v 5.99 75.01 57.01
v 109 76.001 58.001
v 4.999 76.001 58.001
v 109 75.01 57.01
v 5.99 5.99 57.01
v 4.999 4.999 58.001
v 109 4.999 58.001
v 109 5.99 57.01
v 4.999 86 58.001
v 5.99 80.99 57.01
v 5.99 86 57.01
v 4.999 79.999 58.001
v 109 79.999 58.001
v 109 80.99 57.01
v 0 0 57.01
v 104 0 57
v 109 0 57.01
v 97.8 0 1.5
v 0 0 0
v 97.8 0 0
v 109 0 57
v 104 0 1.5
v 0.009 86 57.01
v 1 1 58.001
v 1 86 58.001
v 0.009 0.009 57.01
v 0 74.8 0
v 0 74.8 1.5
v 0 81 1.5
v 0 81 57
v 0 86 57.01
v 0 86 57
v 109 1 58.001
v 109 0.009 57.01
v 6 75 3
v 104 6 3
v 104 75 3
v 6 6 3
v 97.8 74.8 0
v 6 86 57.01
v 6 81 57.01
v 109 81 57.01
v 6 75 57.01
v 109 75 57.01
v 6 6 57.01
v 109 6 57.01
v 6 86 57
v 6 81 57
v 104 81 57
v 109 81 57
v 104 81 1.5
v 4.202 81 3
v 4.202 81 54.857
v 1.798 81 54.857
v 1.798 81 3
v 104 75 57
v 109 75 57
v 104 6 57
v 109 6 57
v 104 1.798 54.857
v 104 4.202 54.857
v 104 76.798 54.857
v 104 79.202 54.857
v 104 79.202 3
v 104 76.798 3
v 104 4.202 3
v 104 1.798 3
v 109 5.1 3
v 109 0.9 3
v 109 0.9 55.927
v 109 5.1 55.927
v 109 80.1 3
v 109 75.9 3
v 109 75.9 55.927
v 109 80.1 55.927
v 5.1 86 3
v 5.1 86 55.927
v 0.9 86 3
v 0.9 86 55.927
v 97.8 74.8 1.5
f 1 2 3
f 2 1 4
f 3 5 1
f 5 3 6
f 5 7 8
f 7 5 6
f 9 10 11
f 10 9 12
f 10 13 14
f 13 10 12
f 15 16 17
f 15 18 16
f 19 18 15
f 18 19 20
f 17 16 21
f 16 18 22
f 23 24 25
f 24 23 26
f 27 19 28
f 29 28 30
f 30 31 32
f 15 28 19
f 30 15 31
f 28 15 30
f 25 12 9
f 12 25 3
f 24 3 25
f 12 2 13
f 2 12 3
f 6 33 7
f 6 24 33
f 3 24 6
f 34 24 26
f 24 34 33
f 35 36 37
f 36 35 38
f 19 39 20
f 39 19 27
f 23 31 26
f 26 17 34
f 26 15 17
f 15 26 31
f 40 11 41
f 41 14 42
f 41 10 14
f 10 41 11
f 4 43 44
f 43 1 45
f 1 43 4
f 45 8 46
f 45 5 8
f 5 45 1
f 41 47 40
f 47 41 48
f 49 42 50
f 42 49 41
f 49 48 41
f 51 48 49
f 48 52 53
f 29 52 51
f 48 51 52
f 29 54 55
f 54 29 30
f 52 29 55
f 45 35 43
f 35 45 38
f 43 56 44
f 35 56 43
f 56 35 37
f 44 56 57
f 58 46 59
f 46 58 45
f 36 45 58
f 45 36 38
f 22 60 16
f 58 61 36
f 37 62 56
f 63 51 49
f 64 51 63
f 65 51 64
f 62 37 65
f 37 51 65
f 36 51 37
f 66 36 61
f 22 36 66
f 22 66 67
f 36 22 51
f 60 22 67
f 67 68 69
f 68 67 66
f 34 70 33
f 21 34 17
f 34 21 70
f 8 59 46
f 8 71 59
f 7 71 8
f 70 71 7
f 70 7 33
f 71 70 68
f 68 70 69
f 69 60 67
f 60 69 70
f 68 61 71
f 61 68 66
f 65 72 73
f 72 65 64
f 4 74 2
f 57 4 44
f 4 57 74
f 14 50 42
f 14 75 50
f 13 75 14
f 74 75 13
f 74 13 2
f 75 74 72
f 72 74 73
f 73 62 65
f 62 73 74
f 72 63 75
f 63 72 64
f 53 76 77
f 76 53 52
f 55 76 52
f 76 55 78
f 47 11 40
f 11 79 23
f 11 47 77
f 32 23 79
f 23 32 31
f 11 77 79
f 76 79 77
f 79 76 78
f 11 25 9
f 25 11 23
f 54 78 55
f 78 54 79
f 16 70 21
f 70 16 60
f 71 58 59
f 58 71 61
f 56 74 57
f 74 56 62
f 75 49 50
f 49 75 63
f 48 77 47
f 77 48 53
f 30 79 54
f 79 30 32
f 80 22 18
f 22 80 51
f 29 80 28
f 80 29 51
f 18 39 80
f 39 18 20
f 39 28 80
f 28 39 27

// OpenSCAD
// ============================================================================
// cutlery_box.scad
// Graduated 3-chamber disposable-cutlery box (Option 3) — CUT-FROM-SOLID port
// of build_box.py, for a 120 x 120 x 120 mm printer (AOSEED).
//
// WHY THIS PORT EXISTS (the whole point):
//   The hand-mesh generator (build_box.py) could not keep the 1 mm rim chamfer
//   continuous across the female dovetail joints, because where a slot's flared
//   corner crosses the sloped chamfer it needs a true boolean intersection.
//   OpenSCAD HAS that boolean kernel, so here we do exactly the "cut-from-solid"
//   thing:
//      1. Build the ENTIRE box as ONE solid, WITH the chamfer already on it.
//      2. difference() out vertical dovetail prisms ( /_\ cross-section ),
//         running from just above the base plate up THROUGH the rim, to both
//         (a) form the sliding-dovetail joints, and
//         (b) split the box into 6 bed-sized pieces.
//   Because the cut is a real boolean through the already-chamfered solid, the
//   sloped chamfer<->slot edge is produced for free => the rim chamfer stays
//   CONTINUOUS across every joint, with none of the sliver hacks.
//
// ----------------------------------------------------------------------------
// HOW TO USE
//   In the app:  set `part` below (or use the Customizer dropdown), F5 to
//                preview, F6 to render, then File > Export > STL.
//   One piece (CLI):
//      openscad -o body_knife_A.stl -D 'part="knife_A"' cutlery_box.scad
//   ALL SIX (bash, run from this folder):
//      for p in knife_A knife_B fork_A fork_B spoon_A spoon_B; do \
//        openscad -o "body_$p.stl" -D "part=\"$p\"" cutlery_box.scad ; done
//   PNG preview of one piece:
//      openscad -o knife_B.png --imgsize=1400,1000 --autocenter --viewall \
//        -D 'part="knife_B"' cutlery_box.scad
//
//   Pieces are modelled in ASSEMBLED coordinates (floor-down, z=0 is the bed),
//   so importing all six STLs together shows the assembled box directly; your
//   slicer will auto-drop each one onto the plate for printing.
//
// BED SANITY: every piece is <= 120 mm in X, Y, Z.
//   Z = 58 mm. Widest piece = spoon at 117 mm (Y). A-halves reach 109 mm (X,
//   including the protruding dovetail key). All under 120.
//
// !! I could NOT run OpenSCAD to verify this file (no binary in my sandbox) !!
//   - The rim chamfer is a SMOOTH, true-45 bevel built from hull() frustums of
//     convex rectangles. Works in every OpenSCAD since ~2015 (incl. Homebrew
//     2021.01). No stepped staircase -- and, crucially, it makes box() a clean
//     well-formed solid so the per-part booleans resolve reliably (the old
//     14-slice staircase was fragile and CGAL was dropping the walls of the
//     interior parts, leaving only the key prisms => "floating boxes").
//   - roof() is still available behind USE_ROOF=true for those who have it
//     (2021.01+ snapshots); for THIS rectangular design it is identical, so it
//     is NOT required.
//   - After F6, check the console for "WARNING"/"not a valid 2-manifold".
//     If a tenon ever looks detached, bump EPS to 0.05.
// ============================================================================


/* [Part to render / export] */
part = "knife_A"; // [knife_A, knife_B, fork_A, fork_B, spoon_A, spoon_B, assembly]

/* [Chamfer method] */
// false = smooth hull() frustum bevel (default, any OpenSCAD); true = roof() (2021.01+)
USE_ROOF = false;

/* [Heights (mm)] */
BASE   = 3.0;     // floor / base-plate thickness
COMP_H = 55.0;    // interior wall height above the floor (cutlery stack depth)

/* [Walls (mm)] */
HOST_T   = 6.0;     // thickness of every wall (thick enough to host a dovetail)
HALF_LEN = 104.0;   // printed length of each half (A = near, B = far); <120 incl. key

/* [Chamber bays (mm)] */
N_COL     = 3;       // columns of cutlery per chamber
KNIFE_COL = 23.0;    // -> knife bay 69  (3 x 19 mm knives + play)
FORK_COL  = 33.0;    // -> fork  bay 99  (3 x 29 mm forks  + play)
SPOON_COL = 37.0;    // -> spoon bay 111 (3 x 34 mm spoons + play, trimmed <120)

/* [Dovetail joint (mm)] */
DT_DEPTH = 5.0;   // tail protrusion past the seam (male key depth)
DT_NECK  = 1.2;   // half-width at the seam face (narrow)
DT_FLARE = 2.1;   // half-width at the tip (wide -> locks)
DT_CLR   = 0.4;   // FLANK/seam slide clearance added to the female socket (do not change for fit)
DT_DEPTH_RELIEF = 0.3; // extra depth on the socket BACK only, so the tail tip never bottoms out

/* [Hidden-dovetail top cap / "hat" (mm)] */
// The dovetail otherwise shows its trapezoid outline on the TOP edge of the wall.
// To hide it, the MALE piece extends the wall's full-width top (chamfer included)
// across the key footprint -> a flush, continuous top. The FEMALE piece gets a
// matching top RECESS (cap footprint + CAP_CLR) so the cap drops straight in.
// Result: the top reads as one surface with a single straight seam line at the cap
// tip; the dovetail joinery lives entirely below the cap.
//
// SELF-SUPPORTING UNDERSIDE: the cap reaches the FULL wall width at the chamfer base
// (so the top edge reads as the wall extended, with NO recessed sliver on the outer
// face), and its underside is ONE planar ramp from the chamfer's OUTER CORNER
// (half-width HOST_T/2 at z = BODY_H-CHAMFER) down to the dovetail-neck half-width
// (CAP_FOOT) at CAP_SLANT_DEG from horizontal. No little horizontal step. The ramp
// reaching full width exactly at the chamfer base means "ramp top" == "chamfer base"
// (CAP_H is DERIVED). The FEMALE recess is the same ramp + CAP_CLR play.
// TRADEOFF: because the cap runs all the way to the outer corner, the female wall
// tapers to ~0 at z = BODY_H-CHAMFER -> a thin feather edge at the joint (gradual at
// CAP_SLANT_DEG, hidden inside the joint when assembled). Accepted per design intent.
CAP_SLANT_DEG = 50;     // cap underside ramp angle from horizontal (50 = self-supporting, long flare)
CAP_FOOT = DT_NECK;     // cap-underside half-width where it meets the dovetail neck
CAP_CLR = 0.3;          // slide clearance so the male cap seats into the female top recess

/* [Rim chamfer (mm)] */
CHAMFER = 1.0;    // 45-deg comfort break broken along the top wall edges

/* [Base half-lap / anti-warp (mm)] */
// Neighbouring base plates overlap as a HORIZONTAL half-lap (shiplap) at mid-base
// height, so corners stay coplanar (no lift/protrusion). Horizontal lap faces do
// NOT bind the vertical-drop assembly. Shingle direction: A->B and knife->fork->spoon.
LAP_LEN = 6;        // overlap past the A/B seam and the knife/fork seam
LAP_LEN_FS = 2;     // overlap past the fork/SPOON seam -- SMALLER: spoon is the
                    // tightest piece (117mm of the 120mm bed); a 6mm lap there
                    // would push spoon to 123mm. 2mm keeps spoon at 119mm.
LAP_Z   = BASE/2;   // 1.5 -- horizontal split height of the lap (bottom vs top half)
LAP_CLR = 0.2;      // in-plane clearance so the shelf isn't a press fit


/* [Hidden] */
EPS      = 0.01;          // tiny overlap so abutting solids fuse cleanly in CGAL
// Upper-chamber pieces (fork, spoon) were cut by a cell plane laid EXACTLY on the
// divider wall's far face (the lower chamber owns that wall). intersection() along a
// plane coincident with an existing box face makes CGAL leave a ZERO-THICKNESS copy
// of the wall face -> edge-manifold + "watertight" but degenerate (OpenSCAD shows it
// as a blue back-face; Tinkercad thickens it into a phantom block). SEAM_EPS nudges
// those cut planes a hair INTO the open bay so they no longer coincide with any box
// face -> no flap. 0.02 mm is physically nothing but is well clear of CGAL's tolerance.
SEAM_EPS = 0.02;
CUT_OVER = 1.0;           // how far dovetail cutters overshoot the rim (clean cut)

BODY_H    = BASE + COMP_H;     // 58  total height
END_WALL  = HOST_T;            // end walls are dovetail hosts too -> equally thick
TOTAL_LEN = 2 * HALF_LEN;      // 208 assembled length (end wall .. end wall)

// hidden-cap ramp geometry (derived).
//   CAP_HW    = cap MAX half-width = HOST_T/2 (the full wall edge) at the chamfer base.
//   CAP_RISE  = vertical height of the self-supporting CAP_SLANT_DEG underside ramp.
//   CAP_ZRAMP = where the cap reaches full width = the chamfer base (BODY_H-CHAMFER), so
//               the ramp runs straight to the chamfer OUTER CORNER (no horizontal step).
//   CAP_ZBOT  = cap bottom = ramp start; CAP_H derived from it (for reference/report).
//   CAP_ZRAMP_R = recess ramp top, shifted down by CAP_CLR so the recess ramp stays
//               parallel to the cap ramp with uniform play.
CAP_HW      = HOST_T/2;   // cap reaches the FULL wall edge at the chamfer base
CAP_RISE    = (CAP_HW - CAP_FOOT) * tan(CAP_SLANT_DEG);
CAP_ZRAMP   = BODY_H - CHAMFER;               // full width exactly at the chamfer base / outer corner
CAP_ZBOT    = CAP_ZRAMP - CAP_RISE;
CAP_H       = BODY_H - CAP_ZBOT;              // derived; reported
CAP_ZRAMP_R = CAP_ZRAMP;   // recess ramp ALSO tops at the chamfer corner (mirror the cap) -> no vertical lip
// sanity checks
assert(CAP_ZBOT > BASE + 1,
       "cap zone dips too low -- raise CAP_SLANT_DEG");
assert(CAP_HW >= DT_FLARE,
       "cap too narrow to cover the dovetail tail");

// bay widths
KNIFE_BAY = N_COL * KNIFE_COL; // 69
FORK_BAY  = N_COL * FORK_COL;  // 99
SPOON_BAY = N_COL * SPOON_COL; // 111

// ---- Y layout (width direction): wall | bay | divider | bay | divider | bay | wall
KNIFE_Y0 = 0;
KNIFE_Y1 = HOST_T + KNIFE_BAY + HOST_T;        // 0..81   (outer wall + bay + divider)
FORK_Y0  = KNIFE_Y1;                           // 81
FORK_Y1  = FORK_Y0 + FORK_BAY + HOST_T;        // 81..186 (bay + divider)
SPOON_Y0 = FORK_Y1;                            // 186
SPOON_Y1 = SPOON_Y0 + SPOON_BAY + HOST_T;      // 186..303(bay + outer wall)
EXT_W    = SPOON_Y1;                           // 303 total width

// lengthwise wall Y-bands [y0,y1] (host the A/B dovetails) + their centers
OUTER_L  = [0, HOST_T];                                       // [0,6]    c=3
DIV_KF   = [HOST_T + KNIFE_BAY, HOST_T + KNIFE_BAY + HOST_T]; // [75,81]  c=78
DIV_FS   = [FORK_Y0 + FORK_BAY, FORK_Y0 + FORK_BAY + HOST_T]; // [180,186]c=183
OUTER_R  = [SPOON_Y1 - HOST_T, SPOON_Y1];                     // [297,303]c=300

// the three OPEN bays are rectangular holes in the wall footprint:
//   footprint = outer rectangle MINUS these bays  (== the 6 walls; verified).
// The smooth chamfer is built from exactly this decomposition.
BAY_X0 = END_WALL;              // 6
BAY_X1 = TOTAL_LEN - END_WALL;  // 202
BAYS = [
    [BAY_X0, BAY_X1, HOST_T,   HOST_T + KNIFE_BAY],   // knife bay [6,202] x [6,75]
    [BAY_X0, BAY_X1, FORK_Y0,  FORK_Y0 + FORK_BAY],   // fork  bay [6,202] x [81,180]
    [BAY_X0, BAY_X1, SPOON_Y0, SPOON_Y0 + SPOON_BAY], // spoon bay [6,202] x [186,297]
];

YC_OUTL  = OUTER_L[0] + HOST_T/2;   // 3   outer-left wall center
YC_DIVKF = DIV_KF[0]  + HOST_T/2;   // 78  knife/fork divider center
YC_DIVFS = DIV_FS[0]  + HOST_T/2;   // 183 fork/spoon divider center
YC_OUTR  = OUTER_R[0] + HOST_T/2;   // 300 outer-right wall center

// seams
AB_SEAM = HALF_LEN;               // 104  A/B length seam (x)
SEAM_KF = FORK_Y0;                // 81   knife/fork width seam (y)
SEAM_FS = SPOON_Y0;              // 186  fork/spoon width seam (y)
ENDC_A  = END_WALL/2;             // 3    A end-wall center (x) -> chamber dovetails
ENDC_B  = TOTAL_LEN - END_WALL/2; // 205  B end-wall center (x)


// ============================================================================
// 2D wall footprint (cross-section of all walls, constant in z for the straight
// part). Union of: 2 full-width end walls + 4 lengthwise walls between them.
// ============================================================================
module wall_footprint_2d() {
    // footprint = outer rectangle minus the 3 open bays  (== the 6 walls)
    difference() {
        square([TOTAL_LEN, EXT_W]);
        for (b = BAYS) translate([b[0], b[2]]) square([b[1] - b[0], b[3] - b[2]]);
    }
}

// ============================================================================
// The full chamfered box solid = base plate + walls with a continuous 1 mm
// top-rim chamfer. Built ONCE; every piece is carved out of this.
// ============================================================================
module chamfer_cap() {
    // SMOOTH 45 rim chamfer over z[BODY_H-CHAMFER, BODY_H], in absolute coords.
    zm = BODY_H - CHAMFER;
    if (USE_ROOF) {
        // exact straight-skeleton roof, capped at CHAMFER height (needs roof()).
        intersection() {
            translate([0,0,zm]) roof() wall_footprint_2d();
            translate([0,0,zm]) linear_extrude(CHAMFER + EPS) wall_footprint_2d();
        }
    } else {
        // DEFAULT: true 45 bevel as hull() frustums of CONVEX rectangles -> smooth
        // AND a clean manifold.  Since footprint = outer - bays, the chamfer of the
        // footprint = (outer rectangle beveled inward) MINUS (each bay beveled so it
        // grows toward the top, which bevels every bay-facing rim).  All hull()s are
        // on convex rectangles, so nothing gets convex-filled.
        difference() {
            // outer perimeter frustum: full outer rect at zm -> inset by CHAMFER at top
            hull() {
                translate([0,0,zm])     linear_extrude(0.001) square([TOTAL_LEN, EXT_W]);
                translate([0,0,BODY_H]) linear_extrude(0.001) offset(delta=-CHAMFER) square([TOTAL_LEN, EXT_W]);
            }
            // each bay grows by CHAMFER toward the top -> bevels its surrounding rim.
            // (overshoots z a hair past both ends so the cut is clean.)
            for (b = BAYS)
                hull() {
                    translate([0,0,zm-EPS])     linear_extrude(0.001)
                        translate([b[0],b[2]]) offset(delta=-EPS)        square([b[1]-b[0], b[3]-b[2]]);
                    translate([0,0,BODY_H+EPS]) linear_extrude(0.001)
                        translate([b[0],b[2]]) offset(delta=CHAMFER+EPS) square([b[1]-b[0], b[3]-b[2]]);
                }
        }
    }
}

module box() {
    zm = BODY_H - CHAMFER;
    union() {
        cube([TOTAL_LEN, EXT_W, BASE]);                                        // base plate z[0,3]
        translate([0,0,BASE]) linear_extrude(zm - BASE + EPS) wall_footprint_2d(); // straight walls z[3,57]
        chamfer_cap();                                                         // smooth chamfer z[57,58]
    }
}

// ============================================================================
// Dovetail prisms ( /_\ ). Vertical, z[BASE, BODY_H+CUT_OVER] so they cut
// through the rim but leave the base plate continuous. The near face is pushed
// back EPS so a male key always fuses to its wall.
//   male key   : half_n=DT_NECK,         half_f=DT_FLARE
//   female slot: half_n=DT_NECK+DT_CLR,  half_f=DT_FLARE+DT_CLR
// ============================================================================
module dt_prism_X(seam_x, yc, half_n, half_f) {   // perpendicular to X, grows +X
    translate([0,0,BASE]) linear_extrude(BODY_H - BASE + CUT_OVER)
        polygon([[seam_x - EPS,        yc - half_n],
                 [seam_x + DT_DEPTH,   yc - half_f],
                 [seam_x + DT_DEPTH,   yc + half_f],
                 [seam_x - EPS,        yc + half_n]]);
}
module dt_prism_Y(seam_y, xc, half_n, half_f) {   // perpendicular to Y, grows +Y
    translate([0,0,BASE]) linear_extrude(BODY_H - BASE + CUT_OVER)
        polygon([[xc - half_n, seam_y - EPS],
                 [xc - half_f, seam_y + DT_DEPTH],
                 [xc + half_f, seam_y + DT_DEPTH],
                 [xc + half_n, seam_y - EPS]]);
}
module ab_key   (yc)        { dt_prism_X(AB_SEAM, yc, DT_NECK, DT_FLARE); }
module ch_key   (seam_y, xc){ dt_prism_Y(seam_y, xc, DT_NECK, DT_FLARE); }

// Female sockets = male + DT_CLR on the flanks/seam (unchanged), PLUS a straight
// back-face relief of DT_DEPTH_RELIEF so the tail tip never bottoms out. The
// relief is a rectangle tacked onto the trapezoid's tip at the SAME flare width,
// so the angled flank faces (and their 0.4 mm slide clearance) are untouched.
module ab_socket(yc) {
    dt_prism_X(AB_SEAM, yc, DT_NECK + DT_CLR, DT_FLARE + DT_CLR);
    translate([0,0,BASE]) linear_extrude(BODY_H - BASE + CUT_OVER)
        translate([AB_SEAM + DT_DEPTH, yc - (DT_FLARE + DT_CLR)])
            square([DT_DEPTH_RELIEF, 2*(DT_FLARE + DT_CLR)]);          // back relief, +X
}
module ch_socket(seam_y, xc) {
    dt_prism_Y(seam_y, xc, DT_NECK + DT_CLR, DT_FLARE + DT_CLR);
    translate([0,0,BASE]) linear_extrude(BODY_H - BASE + CUT_OVER)
        translate([xc - (DT_FLARE + DT_CLR), seam_y + DT_DEPTH])
            square([2*(DT_FLARE + DT_CLR), DT_DEPTH_RELIEF]);          // back relief, +Y
}

// ===== hidden-dovetail top cap ("hat"), SELF-SUPPORTING underside ===============
// MALE cap: a FULL-wall-width hat whose underside is ONE planar ramp from the chamfer's
// OUTER CORNER (half-width CAP_HW = HOST_T/2 at CAP_ZRAMP = BODY_H-CHAMFER) down to the
// dovetail-neck half-width (CAP_FOOT) at CAP_SLANT_DEG from horizontal -> the self-
// supporting shoulder, running straight to the corner (no horizontal step). Built as
// hull(narrow bottom slab buried in the tail neck, full-width top slab through the rim);
// box() trims it to the wall and adds the continuous rim chamfer for free, so the outer
// top edge reads as the wall extended (no recessed sliver). The protruding NOSE is left
// SQUARE (vertical) -- hidden in the female socket when assembled.
// TRADEOFF: the female wall tapers to ~0 at z=BODY_H-CHAMFER (a thin feather edge at the
// joint, gradual at CAP_SLANT_DEG) -- accepted per design intent.
module ab_cap(yc) {   // A/B seam, grows +X past the seam (length direction)
    hull() {
        translate([AB_SEAM - EPS, yc - CAP_FOOT, CAP_ZBOT])
            cube([DT_DEPTH + EPS, 2*CAP_FOOT, EPS]);
        translate([AB_SEAM - EPS, yc - CAP_HW,   CAP_ZRAMP])
            cube([DT_DEPTH + EPS, 2*CAP_HW, (BODY_H + CUT_OVER) - CAP_ZRAMP]);
    }
}
module ch_cap(seam_y, xc) {   // chamber seam, grows +Y past the seam (in the end wall)
    hull() {
        translate([xc - CAP_FOOT, seam_y - EPS, CAP_ZBOT])
            cube([2*CAP_FOOT, DT_DEPTH + EPS, EPS]);
        translate([xc - CAP_HW,   seam_y - EPS, CAP_ZRAMP])
            cube([2*CAP_HW, DT_DEPTH + EPS, (BODY_H + CUT_OVER) - CAP_ZRAMP]);
    }
}
// FEMALE recess: the SAME ramp grown by CAP_CLR (flanks, tip, floor, and ramp shifted down
// by CAP_CLR so it stays parallel) -> the cap seats with uniform slide clearance. It opens
// to the wall edge (and a hair past, into air) so the cap's full-width corner drops in;
// this is what leaves the thin female feather at the top (accepted). Open upward + toward seam.
module ab_cap_neg(yc) {
    hull() {
        translate([AB_SEAM - EPS, yc - (CAP_FOOT + CAP_CLR), CAP_ZBOT - CAP_CLR])
            cube([DT_DEPTH + CAP_CLR + EPS, 2*(CAP_FOOT + CAP_CLR), EPS]);
        translate([AB_SEAM - EPS, yc - (CAP_HW + EPS), CAP_ZRAMP_R])
            cube([DT_DEPTH + CAP_CLR + EPS, 2*(CAP_HW + EPS), (BODY_H + CUT_OVER + 1) - CAP_ZRAMP_R]);
    }
}
module ch_cap_neg(seam_y, xc) {
    hull() {
        translate([xc - (CAP_FOOT + CAP_CLR), seam_y - EPS, CAP_ZBOT - CAP_CLR])
            cube([2*(CAP_FOOT + CAP_CLR), DT_DEPTH + CAP_CLR + EPS, EPS]);
        translate([xc - (CAP_HW + EPS), seam_y - EPS, CAP_ZRAMP_R])
            cube([2*(CAP_HW + EPS), DT_DEPTH + CAP_CLR + EPS, (BODY_H + CUT_OVER + 1) - CAP_ZRAMP_R]);
    }
}

// rectangular cell (x[xa,xb], y[ya,yb], full height + margin) used to split pieces
module cell(xa, xb, ya, yb) {
    translate([xa, ya, -1]) cube([xb - xa, yb - ya, BODY_H + 11]);
}

// ===== base half-lap (shiplap) =================================================
// HORIZONTAL lap at mid-base height: the shelf-owner keeps its BOTTOM half
// (z 0..LAP_Z) extending LAP_LEN past the seam; the neighbour has its bottom half
// REMOVED there (keeps only the top half) and lands flat on the shelf. Horizontal
// faces => no binding during the vertical drop. Shelves live entirely in the base
// (z < BASE), well clear of the wall dovetails (z >= BASE).
// Shingle = FEMALE-first (matches the no-notch dovetail assembly order, which
// lowers the male piece onto the female): the B half owns the A/B shelf (grows
// -X into A) and the UPPER chamber (fork, spoon) owns the chamber shelf (grows
// -Y into the lower chamber).  Order: spoon, fork, knife; B before A.
module lap_shelf_X(y0, y1) {                 // B-side shelf, grows -X into A past AB_SEAM
    // +EPS past AB_SEAM so the shelf interpenetrates (not just abuts) its own B body -> fuses cleanly.
    translate([AB_SEAM - LAP_LEN, y0, 0]) cube([LAP_LEN + EPS, y1 - y0, LAP_Z]);
}
module lap_neg_X(y0, y1) {                   // A-side: remove bottom half to receive it
    translate([AB_SEAM - LAP_LEN - LAP_CLR, y0 - EPS, -EPS])
        cube([LAP_LEN + LAP_CLR + EPS, (y1 - y0) + 2*EPS, LAP_Z + EPS]);
}
module lap_shelf_Y(seam_y, x0, x1, ln=LAP_LEN) {   // upper-chamber shelf, grows -Y into lower
    // grows -Y by `ln` into the lower chamber AND +Y by 2*SEAM_EPS past the seam so it
    // always overlaps the (SEAM_EPS-nudged) body floor and stays fused -> no floating shelf.
    translate([x0, seam_y - ln, 0]) cube([x1 - x0, ln + 2*SEAM_EPS, LAP_Z]);
}
module lap_neg_Y(seam_y, x0, x1, ln=LAP_LEN) {     // lower-chamber: remove bottom half
    translate([x0 - EPS, seam_y - ln - LAP_CLR, -EPS])
        cube([(x1 - x0) + 2*EPS, ln + LAP_CLR + EPS, LAP_Z + EPS]);
}

// ============================================================================
// The six pieces.  piece = intersection(box, cell + own male keys) - own sockets
//   A halves are MALE on the A/B seam (keep the key); B halves are FEMALE (slot).
//   On a chamber seam the LEFT chamber is male (+Y), the right chamber is female.
// ============================================================================
// Base half-lap shingling (FEMALE-first, Option 1):
//   A/B seam  -> the B half owns the bottom shelf (grows -X), A has the negative.
//   chamber   -> the UPPER chamber (fork, spoon) owns the shelf (grows -Y); the
//                lower chamber (knife, fork) has the negative.
//   Assembly order: spoon, fork, knife; B before A (male lowered onto female).
// Center crossings (104,81)&(104,186): the CHAMBER shelf (fork_A / spoon_A) owns the
//   crossing square; the B-half A/B shelf (knife_B / fork_B) is CLIPPED short of the
//   chamber seam by LAP_LEN so two shelves never collide.
module knife_A() {                                       // placed LAST; receives everything
    difference() {
        intersection() {
            box();
            union() {
                cell(-1, AB_SEAM, KNIFE_Y0 - 1, KNIFE_Y1);
                ab_key(YC_OUTL); ab_key(YC_DIVKF); ch_key(SEAM_KF, ENDC_A);
                ab_cap(YC_OUTL); ab_cap(YC_DIVKF); ch_cap(SEAM_KF, ENDC_A);  // hide tops (male)
            }
        }
        lap_neg_X(KNIFE_Y0, KNIFE_Y1);            // receive knife_B's A/B shelf
        lap_neg_Y(SEAM_KF, 0, AB_SEAM);           // receive fork_A's chamber shelf
    }
}

module knife_B() {
    difference() {
        union() {
            intersection() {
                box();
                union() {
                    cell(AB_SEAM, TOTAL_LEN + 1, KNIFE_Y0 - 1, KNIFE_Y1);
                    ch_key(SEAM_KF, ENDC_B);
                    ch_cap(SEAM_KF, ENDC_B);                // hide top (male, chamber)
                }
            }
            lap_shelf_X(KNIFE_Y0, KNIFE_Y1 - LAP_LEN);  // A/B shelf -> knife_A (CLIPPED at y=81 crossing)
        }
        ab_socket(YC_OUTL); ab_socket(YC_DIVKF);
        ab_cap_neg(YC_OUTL); ab_cap_neg(YC_DIVKF);      // top recesses to receive knife_A's caps (female)
        lap_neg_Y(SEAM_KF, AB_SEAM, TOTAL_LEN);         // receive fork_B's chamber shelf
    }
}

module fork_A() {
    difference() {
        union() {
            intersection() {
                box();
                union() {
                    cell(-1, AB_SEAM, FORK_Y0 + SEAM_EPS, FORK_Y1);  // -Y cut nudged off the divider face
                    ab_key(YC_DIVFS); ch_key(SEAM_FS, ENDC_A);
                    ab_cap(YC_DIVFS); ch_cap(SEAM_FS, ENDC_A);       // hide tops (male)
                }
            }
            lap_shelf_Y(SEAM_KF, 0, AB_SEAM);           // chamber shelf -> knife_A (owns crossing)
        }
        lap_neg_X(FORK_Y0, FORK_Y1);                    // receive fork_B's A/B shelf
        ch_socket(SEAM_KF, ENDC_A);
        ch_cap_neg(SEAM_KF, ENDC_A);                    // top recess to receive knife_A's chamber cap (female)
        lap_neg_Y(SEAM_FS, 0, AB_SEAM, LAP_LEN_FS);     // receive spoon_A's (small) chamber shelf
    }
}

module fork_B() {
    difference() {
        union() {
            intersection() {
                box();
                union() {
                    cell(AB_SEAM, TOTAL_LEN + 1, FORK_Y0 + SEAM_EPS, FORK_Y1);  // -Y cut nudged off the divider face
                    ch_key(SEAM_FS, ENDC_B);
                    ch_cap(SEAM_FS, ENDC_B);                // hide top (male, chamber)
                }
            }
            lap_shelf_X(FORK_Y0, FORK_Y1 - LAP_LEN_FS); // A/B shelf -> fork_A (CLIPPED at y=186 crossing)
            lap_shelf_Y(SEAM_KF, AB_SEAM, TOTAL_LEN);   // chamber shelf -> knife_B
        }
        ab_socket(YC_DIVFS);
        ab_cap_neg(YC_DIVFS);                           // top recess to receive fork_A's A/B cap (female)
        ch_socket(SEAM_KF, ENDC_B);
        ch_cap_neg(SEAM_KF, ENDC_B);                    // top recess to receive knife_B's chamber cap (female)
        lap_neg_Y(SEAM_FS, AB_SEAM, TOTAL_LEN, LAP_LEN_FS); // receive spoon_B's (small) chamber shelf
    }
}

module spoon_A() {
    difference() {
        union() {
            intersection() {
                box();
                union() {
                    cell(-1, AB_SEAM, SPOON_Y0 + SEAM_EPS, SPOON_Y1 + 1);  // -Y cut nudged off the divider face
                    ab_key(YC_OUTR);
                    ab_cap(YC_OUTR);                        // hide top (male)
                }
            }
            lap_shelf_Y(SEAM_FS, 0, AB_SEAM, LAP_LEN_FS); // chamber shelf -> fork_A (small; owns crossing)
        }
        lap_neg_X(SPOON_Y0, SPOON_Y1);                  // receive spoon_B's A/B shelf
        ch_socket(SEAM_FS, ENDC_A);
        ch_cap_neg(SEAM_FS, ENDC_A);                    // top recess to receive fork_A's chamber cap (female)
    }
}

module spoon_B() {                                      // placed FIRST; owns shelves
    difference() {
        union() {
            intersection() {
                box();
                union() {
                    cell(AB_SEAM, TOTAL_LEN + 1, SPOON_Y0 + SEAM_EPS, SPOON_Y1 + 1);  // -Y cut nudged off the divider face
                }
            }
            lap_shelf_X(SPOON_Y0, SPOON_Y1);            // A/B shelf -> spoon_A
            lap_shelf_Y(SEAM_FS, AB_SEAM, TOTAL_LEN, LAP_LEN_FS); // chamber shelf -> fork_B (small)
        }
        ab_socket(YC_OUTR);
        ab_cap_neg(YC_OUTR);                            // top recess to receive spoon_A's A/B cap (female)
        ch_socket(SEAM_FS, ENDC_B);
        ch_cap_neg(SEAM_FS, ENDC_B);                    // top recess to receive fork_B's chamber cap (female)
    }
}

// Fast preview: the full continuous-chamfer box (no cuts). The six part modules
// above are the real, separable pieces. To instead see the TRUE assembled
// pieces with their joints (slower — 6 booleans), replace box(); below with:
//   knife_A(); knife_B(); fork_A(); fork_B(); spoon_A(); spoon_B();
module assembly() {
    box();
}

// ============================================================================
// Render dispatch
// ============================================================================
if      (part == "knife_A")  knife_A();
else if (part == "knife_B")  knife_B();
else if (part == "fork_A")   fork_A();
else if (part == "fork_B")   fork_B();
else if (part == "spoon_A")  spoon_A();
else if (part == "spoon_B")  spoon_B();
else if (part == "assembly") assembly();
else echo(str("Unknown part: ", part));
